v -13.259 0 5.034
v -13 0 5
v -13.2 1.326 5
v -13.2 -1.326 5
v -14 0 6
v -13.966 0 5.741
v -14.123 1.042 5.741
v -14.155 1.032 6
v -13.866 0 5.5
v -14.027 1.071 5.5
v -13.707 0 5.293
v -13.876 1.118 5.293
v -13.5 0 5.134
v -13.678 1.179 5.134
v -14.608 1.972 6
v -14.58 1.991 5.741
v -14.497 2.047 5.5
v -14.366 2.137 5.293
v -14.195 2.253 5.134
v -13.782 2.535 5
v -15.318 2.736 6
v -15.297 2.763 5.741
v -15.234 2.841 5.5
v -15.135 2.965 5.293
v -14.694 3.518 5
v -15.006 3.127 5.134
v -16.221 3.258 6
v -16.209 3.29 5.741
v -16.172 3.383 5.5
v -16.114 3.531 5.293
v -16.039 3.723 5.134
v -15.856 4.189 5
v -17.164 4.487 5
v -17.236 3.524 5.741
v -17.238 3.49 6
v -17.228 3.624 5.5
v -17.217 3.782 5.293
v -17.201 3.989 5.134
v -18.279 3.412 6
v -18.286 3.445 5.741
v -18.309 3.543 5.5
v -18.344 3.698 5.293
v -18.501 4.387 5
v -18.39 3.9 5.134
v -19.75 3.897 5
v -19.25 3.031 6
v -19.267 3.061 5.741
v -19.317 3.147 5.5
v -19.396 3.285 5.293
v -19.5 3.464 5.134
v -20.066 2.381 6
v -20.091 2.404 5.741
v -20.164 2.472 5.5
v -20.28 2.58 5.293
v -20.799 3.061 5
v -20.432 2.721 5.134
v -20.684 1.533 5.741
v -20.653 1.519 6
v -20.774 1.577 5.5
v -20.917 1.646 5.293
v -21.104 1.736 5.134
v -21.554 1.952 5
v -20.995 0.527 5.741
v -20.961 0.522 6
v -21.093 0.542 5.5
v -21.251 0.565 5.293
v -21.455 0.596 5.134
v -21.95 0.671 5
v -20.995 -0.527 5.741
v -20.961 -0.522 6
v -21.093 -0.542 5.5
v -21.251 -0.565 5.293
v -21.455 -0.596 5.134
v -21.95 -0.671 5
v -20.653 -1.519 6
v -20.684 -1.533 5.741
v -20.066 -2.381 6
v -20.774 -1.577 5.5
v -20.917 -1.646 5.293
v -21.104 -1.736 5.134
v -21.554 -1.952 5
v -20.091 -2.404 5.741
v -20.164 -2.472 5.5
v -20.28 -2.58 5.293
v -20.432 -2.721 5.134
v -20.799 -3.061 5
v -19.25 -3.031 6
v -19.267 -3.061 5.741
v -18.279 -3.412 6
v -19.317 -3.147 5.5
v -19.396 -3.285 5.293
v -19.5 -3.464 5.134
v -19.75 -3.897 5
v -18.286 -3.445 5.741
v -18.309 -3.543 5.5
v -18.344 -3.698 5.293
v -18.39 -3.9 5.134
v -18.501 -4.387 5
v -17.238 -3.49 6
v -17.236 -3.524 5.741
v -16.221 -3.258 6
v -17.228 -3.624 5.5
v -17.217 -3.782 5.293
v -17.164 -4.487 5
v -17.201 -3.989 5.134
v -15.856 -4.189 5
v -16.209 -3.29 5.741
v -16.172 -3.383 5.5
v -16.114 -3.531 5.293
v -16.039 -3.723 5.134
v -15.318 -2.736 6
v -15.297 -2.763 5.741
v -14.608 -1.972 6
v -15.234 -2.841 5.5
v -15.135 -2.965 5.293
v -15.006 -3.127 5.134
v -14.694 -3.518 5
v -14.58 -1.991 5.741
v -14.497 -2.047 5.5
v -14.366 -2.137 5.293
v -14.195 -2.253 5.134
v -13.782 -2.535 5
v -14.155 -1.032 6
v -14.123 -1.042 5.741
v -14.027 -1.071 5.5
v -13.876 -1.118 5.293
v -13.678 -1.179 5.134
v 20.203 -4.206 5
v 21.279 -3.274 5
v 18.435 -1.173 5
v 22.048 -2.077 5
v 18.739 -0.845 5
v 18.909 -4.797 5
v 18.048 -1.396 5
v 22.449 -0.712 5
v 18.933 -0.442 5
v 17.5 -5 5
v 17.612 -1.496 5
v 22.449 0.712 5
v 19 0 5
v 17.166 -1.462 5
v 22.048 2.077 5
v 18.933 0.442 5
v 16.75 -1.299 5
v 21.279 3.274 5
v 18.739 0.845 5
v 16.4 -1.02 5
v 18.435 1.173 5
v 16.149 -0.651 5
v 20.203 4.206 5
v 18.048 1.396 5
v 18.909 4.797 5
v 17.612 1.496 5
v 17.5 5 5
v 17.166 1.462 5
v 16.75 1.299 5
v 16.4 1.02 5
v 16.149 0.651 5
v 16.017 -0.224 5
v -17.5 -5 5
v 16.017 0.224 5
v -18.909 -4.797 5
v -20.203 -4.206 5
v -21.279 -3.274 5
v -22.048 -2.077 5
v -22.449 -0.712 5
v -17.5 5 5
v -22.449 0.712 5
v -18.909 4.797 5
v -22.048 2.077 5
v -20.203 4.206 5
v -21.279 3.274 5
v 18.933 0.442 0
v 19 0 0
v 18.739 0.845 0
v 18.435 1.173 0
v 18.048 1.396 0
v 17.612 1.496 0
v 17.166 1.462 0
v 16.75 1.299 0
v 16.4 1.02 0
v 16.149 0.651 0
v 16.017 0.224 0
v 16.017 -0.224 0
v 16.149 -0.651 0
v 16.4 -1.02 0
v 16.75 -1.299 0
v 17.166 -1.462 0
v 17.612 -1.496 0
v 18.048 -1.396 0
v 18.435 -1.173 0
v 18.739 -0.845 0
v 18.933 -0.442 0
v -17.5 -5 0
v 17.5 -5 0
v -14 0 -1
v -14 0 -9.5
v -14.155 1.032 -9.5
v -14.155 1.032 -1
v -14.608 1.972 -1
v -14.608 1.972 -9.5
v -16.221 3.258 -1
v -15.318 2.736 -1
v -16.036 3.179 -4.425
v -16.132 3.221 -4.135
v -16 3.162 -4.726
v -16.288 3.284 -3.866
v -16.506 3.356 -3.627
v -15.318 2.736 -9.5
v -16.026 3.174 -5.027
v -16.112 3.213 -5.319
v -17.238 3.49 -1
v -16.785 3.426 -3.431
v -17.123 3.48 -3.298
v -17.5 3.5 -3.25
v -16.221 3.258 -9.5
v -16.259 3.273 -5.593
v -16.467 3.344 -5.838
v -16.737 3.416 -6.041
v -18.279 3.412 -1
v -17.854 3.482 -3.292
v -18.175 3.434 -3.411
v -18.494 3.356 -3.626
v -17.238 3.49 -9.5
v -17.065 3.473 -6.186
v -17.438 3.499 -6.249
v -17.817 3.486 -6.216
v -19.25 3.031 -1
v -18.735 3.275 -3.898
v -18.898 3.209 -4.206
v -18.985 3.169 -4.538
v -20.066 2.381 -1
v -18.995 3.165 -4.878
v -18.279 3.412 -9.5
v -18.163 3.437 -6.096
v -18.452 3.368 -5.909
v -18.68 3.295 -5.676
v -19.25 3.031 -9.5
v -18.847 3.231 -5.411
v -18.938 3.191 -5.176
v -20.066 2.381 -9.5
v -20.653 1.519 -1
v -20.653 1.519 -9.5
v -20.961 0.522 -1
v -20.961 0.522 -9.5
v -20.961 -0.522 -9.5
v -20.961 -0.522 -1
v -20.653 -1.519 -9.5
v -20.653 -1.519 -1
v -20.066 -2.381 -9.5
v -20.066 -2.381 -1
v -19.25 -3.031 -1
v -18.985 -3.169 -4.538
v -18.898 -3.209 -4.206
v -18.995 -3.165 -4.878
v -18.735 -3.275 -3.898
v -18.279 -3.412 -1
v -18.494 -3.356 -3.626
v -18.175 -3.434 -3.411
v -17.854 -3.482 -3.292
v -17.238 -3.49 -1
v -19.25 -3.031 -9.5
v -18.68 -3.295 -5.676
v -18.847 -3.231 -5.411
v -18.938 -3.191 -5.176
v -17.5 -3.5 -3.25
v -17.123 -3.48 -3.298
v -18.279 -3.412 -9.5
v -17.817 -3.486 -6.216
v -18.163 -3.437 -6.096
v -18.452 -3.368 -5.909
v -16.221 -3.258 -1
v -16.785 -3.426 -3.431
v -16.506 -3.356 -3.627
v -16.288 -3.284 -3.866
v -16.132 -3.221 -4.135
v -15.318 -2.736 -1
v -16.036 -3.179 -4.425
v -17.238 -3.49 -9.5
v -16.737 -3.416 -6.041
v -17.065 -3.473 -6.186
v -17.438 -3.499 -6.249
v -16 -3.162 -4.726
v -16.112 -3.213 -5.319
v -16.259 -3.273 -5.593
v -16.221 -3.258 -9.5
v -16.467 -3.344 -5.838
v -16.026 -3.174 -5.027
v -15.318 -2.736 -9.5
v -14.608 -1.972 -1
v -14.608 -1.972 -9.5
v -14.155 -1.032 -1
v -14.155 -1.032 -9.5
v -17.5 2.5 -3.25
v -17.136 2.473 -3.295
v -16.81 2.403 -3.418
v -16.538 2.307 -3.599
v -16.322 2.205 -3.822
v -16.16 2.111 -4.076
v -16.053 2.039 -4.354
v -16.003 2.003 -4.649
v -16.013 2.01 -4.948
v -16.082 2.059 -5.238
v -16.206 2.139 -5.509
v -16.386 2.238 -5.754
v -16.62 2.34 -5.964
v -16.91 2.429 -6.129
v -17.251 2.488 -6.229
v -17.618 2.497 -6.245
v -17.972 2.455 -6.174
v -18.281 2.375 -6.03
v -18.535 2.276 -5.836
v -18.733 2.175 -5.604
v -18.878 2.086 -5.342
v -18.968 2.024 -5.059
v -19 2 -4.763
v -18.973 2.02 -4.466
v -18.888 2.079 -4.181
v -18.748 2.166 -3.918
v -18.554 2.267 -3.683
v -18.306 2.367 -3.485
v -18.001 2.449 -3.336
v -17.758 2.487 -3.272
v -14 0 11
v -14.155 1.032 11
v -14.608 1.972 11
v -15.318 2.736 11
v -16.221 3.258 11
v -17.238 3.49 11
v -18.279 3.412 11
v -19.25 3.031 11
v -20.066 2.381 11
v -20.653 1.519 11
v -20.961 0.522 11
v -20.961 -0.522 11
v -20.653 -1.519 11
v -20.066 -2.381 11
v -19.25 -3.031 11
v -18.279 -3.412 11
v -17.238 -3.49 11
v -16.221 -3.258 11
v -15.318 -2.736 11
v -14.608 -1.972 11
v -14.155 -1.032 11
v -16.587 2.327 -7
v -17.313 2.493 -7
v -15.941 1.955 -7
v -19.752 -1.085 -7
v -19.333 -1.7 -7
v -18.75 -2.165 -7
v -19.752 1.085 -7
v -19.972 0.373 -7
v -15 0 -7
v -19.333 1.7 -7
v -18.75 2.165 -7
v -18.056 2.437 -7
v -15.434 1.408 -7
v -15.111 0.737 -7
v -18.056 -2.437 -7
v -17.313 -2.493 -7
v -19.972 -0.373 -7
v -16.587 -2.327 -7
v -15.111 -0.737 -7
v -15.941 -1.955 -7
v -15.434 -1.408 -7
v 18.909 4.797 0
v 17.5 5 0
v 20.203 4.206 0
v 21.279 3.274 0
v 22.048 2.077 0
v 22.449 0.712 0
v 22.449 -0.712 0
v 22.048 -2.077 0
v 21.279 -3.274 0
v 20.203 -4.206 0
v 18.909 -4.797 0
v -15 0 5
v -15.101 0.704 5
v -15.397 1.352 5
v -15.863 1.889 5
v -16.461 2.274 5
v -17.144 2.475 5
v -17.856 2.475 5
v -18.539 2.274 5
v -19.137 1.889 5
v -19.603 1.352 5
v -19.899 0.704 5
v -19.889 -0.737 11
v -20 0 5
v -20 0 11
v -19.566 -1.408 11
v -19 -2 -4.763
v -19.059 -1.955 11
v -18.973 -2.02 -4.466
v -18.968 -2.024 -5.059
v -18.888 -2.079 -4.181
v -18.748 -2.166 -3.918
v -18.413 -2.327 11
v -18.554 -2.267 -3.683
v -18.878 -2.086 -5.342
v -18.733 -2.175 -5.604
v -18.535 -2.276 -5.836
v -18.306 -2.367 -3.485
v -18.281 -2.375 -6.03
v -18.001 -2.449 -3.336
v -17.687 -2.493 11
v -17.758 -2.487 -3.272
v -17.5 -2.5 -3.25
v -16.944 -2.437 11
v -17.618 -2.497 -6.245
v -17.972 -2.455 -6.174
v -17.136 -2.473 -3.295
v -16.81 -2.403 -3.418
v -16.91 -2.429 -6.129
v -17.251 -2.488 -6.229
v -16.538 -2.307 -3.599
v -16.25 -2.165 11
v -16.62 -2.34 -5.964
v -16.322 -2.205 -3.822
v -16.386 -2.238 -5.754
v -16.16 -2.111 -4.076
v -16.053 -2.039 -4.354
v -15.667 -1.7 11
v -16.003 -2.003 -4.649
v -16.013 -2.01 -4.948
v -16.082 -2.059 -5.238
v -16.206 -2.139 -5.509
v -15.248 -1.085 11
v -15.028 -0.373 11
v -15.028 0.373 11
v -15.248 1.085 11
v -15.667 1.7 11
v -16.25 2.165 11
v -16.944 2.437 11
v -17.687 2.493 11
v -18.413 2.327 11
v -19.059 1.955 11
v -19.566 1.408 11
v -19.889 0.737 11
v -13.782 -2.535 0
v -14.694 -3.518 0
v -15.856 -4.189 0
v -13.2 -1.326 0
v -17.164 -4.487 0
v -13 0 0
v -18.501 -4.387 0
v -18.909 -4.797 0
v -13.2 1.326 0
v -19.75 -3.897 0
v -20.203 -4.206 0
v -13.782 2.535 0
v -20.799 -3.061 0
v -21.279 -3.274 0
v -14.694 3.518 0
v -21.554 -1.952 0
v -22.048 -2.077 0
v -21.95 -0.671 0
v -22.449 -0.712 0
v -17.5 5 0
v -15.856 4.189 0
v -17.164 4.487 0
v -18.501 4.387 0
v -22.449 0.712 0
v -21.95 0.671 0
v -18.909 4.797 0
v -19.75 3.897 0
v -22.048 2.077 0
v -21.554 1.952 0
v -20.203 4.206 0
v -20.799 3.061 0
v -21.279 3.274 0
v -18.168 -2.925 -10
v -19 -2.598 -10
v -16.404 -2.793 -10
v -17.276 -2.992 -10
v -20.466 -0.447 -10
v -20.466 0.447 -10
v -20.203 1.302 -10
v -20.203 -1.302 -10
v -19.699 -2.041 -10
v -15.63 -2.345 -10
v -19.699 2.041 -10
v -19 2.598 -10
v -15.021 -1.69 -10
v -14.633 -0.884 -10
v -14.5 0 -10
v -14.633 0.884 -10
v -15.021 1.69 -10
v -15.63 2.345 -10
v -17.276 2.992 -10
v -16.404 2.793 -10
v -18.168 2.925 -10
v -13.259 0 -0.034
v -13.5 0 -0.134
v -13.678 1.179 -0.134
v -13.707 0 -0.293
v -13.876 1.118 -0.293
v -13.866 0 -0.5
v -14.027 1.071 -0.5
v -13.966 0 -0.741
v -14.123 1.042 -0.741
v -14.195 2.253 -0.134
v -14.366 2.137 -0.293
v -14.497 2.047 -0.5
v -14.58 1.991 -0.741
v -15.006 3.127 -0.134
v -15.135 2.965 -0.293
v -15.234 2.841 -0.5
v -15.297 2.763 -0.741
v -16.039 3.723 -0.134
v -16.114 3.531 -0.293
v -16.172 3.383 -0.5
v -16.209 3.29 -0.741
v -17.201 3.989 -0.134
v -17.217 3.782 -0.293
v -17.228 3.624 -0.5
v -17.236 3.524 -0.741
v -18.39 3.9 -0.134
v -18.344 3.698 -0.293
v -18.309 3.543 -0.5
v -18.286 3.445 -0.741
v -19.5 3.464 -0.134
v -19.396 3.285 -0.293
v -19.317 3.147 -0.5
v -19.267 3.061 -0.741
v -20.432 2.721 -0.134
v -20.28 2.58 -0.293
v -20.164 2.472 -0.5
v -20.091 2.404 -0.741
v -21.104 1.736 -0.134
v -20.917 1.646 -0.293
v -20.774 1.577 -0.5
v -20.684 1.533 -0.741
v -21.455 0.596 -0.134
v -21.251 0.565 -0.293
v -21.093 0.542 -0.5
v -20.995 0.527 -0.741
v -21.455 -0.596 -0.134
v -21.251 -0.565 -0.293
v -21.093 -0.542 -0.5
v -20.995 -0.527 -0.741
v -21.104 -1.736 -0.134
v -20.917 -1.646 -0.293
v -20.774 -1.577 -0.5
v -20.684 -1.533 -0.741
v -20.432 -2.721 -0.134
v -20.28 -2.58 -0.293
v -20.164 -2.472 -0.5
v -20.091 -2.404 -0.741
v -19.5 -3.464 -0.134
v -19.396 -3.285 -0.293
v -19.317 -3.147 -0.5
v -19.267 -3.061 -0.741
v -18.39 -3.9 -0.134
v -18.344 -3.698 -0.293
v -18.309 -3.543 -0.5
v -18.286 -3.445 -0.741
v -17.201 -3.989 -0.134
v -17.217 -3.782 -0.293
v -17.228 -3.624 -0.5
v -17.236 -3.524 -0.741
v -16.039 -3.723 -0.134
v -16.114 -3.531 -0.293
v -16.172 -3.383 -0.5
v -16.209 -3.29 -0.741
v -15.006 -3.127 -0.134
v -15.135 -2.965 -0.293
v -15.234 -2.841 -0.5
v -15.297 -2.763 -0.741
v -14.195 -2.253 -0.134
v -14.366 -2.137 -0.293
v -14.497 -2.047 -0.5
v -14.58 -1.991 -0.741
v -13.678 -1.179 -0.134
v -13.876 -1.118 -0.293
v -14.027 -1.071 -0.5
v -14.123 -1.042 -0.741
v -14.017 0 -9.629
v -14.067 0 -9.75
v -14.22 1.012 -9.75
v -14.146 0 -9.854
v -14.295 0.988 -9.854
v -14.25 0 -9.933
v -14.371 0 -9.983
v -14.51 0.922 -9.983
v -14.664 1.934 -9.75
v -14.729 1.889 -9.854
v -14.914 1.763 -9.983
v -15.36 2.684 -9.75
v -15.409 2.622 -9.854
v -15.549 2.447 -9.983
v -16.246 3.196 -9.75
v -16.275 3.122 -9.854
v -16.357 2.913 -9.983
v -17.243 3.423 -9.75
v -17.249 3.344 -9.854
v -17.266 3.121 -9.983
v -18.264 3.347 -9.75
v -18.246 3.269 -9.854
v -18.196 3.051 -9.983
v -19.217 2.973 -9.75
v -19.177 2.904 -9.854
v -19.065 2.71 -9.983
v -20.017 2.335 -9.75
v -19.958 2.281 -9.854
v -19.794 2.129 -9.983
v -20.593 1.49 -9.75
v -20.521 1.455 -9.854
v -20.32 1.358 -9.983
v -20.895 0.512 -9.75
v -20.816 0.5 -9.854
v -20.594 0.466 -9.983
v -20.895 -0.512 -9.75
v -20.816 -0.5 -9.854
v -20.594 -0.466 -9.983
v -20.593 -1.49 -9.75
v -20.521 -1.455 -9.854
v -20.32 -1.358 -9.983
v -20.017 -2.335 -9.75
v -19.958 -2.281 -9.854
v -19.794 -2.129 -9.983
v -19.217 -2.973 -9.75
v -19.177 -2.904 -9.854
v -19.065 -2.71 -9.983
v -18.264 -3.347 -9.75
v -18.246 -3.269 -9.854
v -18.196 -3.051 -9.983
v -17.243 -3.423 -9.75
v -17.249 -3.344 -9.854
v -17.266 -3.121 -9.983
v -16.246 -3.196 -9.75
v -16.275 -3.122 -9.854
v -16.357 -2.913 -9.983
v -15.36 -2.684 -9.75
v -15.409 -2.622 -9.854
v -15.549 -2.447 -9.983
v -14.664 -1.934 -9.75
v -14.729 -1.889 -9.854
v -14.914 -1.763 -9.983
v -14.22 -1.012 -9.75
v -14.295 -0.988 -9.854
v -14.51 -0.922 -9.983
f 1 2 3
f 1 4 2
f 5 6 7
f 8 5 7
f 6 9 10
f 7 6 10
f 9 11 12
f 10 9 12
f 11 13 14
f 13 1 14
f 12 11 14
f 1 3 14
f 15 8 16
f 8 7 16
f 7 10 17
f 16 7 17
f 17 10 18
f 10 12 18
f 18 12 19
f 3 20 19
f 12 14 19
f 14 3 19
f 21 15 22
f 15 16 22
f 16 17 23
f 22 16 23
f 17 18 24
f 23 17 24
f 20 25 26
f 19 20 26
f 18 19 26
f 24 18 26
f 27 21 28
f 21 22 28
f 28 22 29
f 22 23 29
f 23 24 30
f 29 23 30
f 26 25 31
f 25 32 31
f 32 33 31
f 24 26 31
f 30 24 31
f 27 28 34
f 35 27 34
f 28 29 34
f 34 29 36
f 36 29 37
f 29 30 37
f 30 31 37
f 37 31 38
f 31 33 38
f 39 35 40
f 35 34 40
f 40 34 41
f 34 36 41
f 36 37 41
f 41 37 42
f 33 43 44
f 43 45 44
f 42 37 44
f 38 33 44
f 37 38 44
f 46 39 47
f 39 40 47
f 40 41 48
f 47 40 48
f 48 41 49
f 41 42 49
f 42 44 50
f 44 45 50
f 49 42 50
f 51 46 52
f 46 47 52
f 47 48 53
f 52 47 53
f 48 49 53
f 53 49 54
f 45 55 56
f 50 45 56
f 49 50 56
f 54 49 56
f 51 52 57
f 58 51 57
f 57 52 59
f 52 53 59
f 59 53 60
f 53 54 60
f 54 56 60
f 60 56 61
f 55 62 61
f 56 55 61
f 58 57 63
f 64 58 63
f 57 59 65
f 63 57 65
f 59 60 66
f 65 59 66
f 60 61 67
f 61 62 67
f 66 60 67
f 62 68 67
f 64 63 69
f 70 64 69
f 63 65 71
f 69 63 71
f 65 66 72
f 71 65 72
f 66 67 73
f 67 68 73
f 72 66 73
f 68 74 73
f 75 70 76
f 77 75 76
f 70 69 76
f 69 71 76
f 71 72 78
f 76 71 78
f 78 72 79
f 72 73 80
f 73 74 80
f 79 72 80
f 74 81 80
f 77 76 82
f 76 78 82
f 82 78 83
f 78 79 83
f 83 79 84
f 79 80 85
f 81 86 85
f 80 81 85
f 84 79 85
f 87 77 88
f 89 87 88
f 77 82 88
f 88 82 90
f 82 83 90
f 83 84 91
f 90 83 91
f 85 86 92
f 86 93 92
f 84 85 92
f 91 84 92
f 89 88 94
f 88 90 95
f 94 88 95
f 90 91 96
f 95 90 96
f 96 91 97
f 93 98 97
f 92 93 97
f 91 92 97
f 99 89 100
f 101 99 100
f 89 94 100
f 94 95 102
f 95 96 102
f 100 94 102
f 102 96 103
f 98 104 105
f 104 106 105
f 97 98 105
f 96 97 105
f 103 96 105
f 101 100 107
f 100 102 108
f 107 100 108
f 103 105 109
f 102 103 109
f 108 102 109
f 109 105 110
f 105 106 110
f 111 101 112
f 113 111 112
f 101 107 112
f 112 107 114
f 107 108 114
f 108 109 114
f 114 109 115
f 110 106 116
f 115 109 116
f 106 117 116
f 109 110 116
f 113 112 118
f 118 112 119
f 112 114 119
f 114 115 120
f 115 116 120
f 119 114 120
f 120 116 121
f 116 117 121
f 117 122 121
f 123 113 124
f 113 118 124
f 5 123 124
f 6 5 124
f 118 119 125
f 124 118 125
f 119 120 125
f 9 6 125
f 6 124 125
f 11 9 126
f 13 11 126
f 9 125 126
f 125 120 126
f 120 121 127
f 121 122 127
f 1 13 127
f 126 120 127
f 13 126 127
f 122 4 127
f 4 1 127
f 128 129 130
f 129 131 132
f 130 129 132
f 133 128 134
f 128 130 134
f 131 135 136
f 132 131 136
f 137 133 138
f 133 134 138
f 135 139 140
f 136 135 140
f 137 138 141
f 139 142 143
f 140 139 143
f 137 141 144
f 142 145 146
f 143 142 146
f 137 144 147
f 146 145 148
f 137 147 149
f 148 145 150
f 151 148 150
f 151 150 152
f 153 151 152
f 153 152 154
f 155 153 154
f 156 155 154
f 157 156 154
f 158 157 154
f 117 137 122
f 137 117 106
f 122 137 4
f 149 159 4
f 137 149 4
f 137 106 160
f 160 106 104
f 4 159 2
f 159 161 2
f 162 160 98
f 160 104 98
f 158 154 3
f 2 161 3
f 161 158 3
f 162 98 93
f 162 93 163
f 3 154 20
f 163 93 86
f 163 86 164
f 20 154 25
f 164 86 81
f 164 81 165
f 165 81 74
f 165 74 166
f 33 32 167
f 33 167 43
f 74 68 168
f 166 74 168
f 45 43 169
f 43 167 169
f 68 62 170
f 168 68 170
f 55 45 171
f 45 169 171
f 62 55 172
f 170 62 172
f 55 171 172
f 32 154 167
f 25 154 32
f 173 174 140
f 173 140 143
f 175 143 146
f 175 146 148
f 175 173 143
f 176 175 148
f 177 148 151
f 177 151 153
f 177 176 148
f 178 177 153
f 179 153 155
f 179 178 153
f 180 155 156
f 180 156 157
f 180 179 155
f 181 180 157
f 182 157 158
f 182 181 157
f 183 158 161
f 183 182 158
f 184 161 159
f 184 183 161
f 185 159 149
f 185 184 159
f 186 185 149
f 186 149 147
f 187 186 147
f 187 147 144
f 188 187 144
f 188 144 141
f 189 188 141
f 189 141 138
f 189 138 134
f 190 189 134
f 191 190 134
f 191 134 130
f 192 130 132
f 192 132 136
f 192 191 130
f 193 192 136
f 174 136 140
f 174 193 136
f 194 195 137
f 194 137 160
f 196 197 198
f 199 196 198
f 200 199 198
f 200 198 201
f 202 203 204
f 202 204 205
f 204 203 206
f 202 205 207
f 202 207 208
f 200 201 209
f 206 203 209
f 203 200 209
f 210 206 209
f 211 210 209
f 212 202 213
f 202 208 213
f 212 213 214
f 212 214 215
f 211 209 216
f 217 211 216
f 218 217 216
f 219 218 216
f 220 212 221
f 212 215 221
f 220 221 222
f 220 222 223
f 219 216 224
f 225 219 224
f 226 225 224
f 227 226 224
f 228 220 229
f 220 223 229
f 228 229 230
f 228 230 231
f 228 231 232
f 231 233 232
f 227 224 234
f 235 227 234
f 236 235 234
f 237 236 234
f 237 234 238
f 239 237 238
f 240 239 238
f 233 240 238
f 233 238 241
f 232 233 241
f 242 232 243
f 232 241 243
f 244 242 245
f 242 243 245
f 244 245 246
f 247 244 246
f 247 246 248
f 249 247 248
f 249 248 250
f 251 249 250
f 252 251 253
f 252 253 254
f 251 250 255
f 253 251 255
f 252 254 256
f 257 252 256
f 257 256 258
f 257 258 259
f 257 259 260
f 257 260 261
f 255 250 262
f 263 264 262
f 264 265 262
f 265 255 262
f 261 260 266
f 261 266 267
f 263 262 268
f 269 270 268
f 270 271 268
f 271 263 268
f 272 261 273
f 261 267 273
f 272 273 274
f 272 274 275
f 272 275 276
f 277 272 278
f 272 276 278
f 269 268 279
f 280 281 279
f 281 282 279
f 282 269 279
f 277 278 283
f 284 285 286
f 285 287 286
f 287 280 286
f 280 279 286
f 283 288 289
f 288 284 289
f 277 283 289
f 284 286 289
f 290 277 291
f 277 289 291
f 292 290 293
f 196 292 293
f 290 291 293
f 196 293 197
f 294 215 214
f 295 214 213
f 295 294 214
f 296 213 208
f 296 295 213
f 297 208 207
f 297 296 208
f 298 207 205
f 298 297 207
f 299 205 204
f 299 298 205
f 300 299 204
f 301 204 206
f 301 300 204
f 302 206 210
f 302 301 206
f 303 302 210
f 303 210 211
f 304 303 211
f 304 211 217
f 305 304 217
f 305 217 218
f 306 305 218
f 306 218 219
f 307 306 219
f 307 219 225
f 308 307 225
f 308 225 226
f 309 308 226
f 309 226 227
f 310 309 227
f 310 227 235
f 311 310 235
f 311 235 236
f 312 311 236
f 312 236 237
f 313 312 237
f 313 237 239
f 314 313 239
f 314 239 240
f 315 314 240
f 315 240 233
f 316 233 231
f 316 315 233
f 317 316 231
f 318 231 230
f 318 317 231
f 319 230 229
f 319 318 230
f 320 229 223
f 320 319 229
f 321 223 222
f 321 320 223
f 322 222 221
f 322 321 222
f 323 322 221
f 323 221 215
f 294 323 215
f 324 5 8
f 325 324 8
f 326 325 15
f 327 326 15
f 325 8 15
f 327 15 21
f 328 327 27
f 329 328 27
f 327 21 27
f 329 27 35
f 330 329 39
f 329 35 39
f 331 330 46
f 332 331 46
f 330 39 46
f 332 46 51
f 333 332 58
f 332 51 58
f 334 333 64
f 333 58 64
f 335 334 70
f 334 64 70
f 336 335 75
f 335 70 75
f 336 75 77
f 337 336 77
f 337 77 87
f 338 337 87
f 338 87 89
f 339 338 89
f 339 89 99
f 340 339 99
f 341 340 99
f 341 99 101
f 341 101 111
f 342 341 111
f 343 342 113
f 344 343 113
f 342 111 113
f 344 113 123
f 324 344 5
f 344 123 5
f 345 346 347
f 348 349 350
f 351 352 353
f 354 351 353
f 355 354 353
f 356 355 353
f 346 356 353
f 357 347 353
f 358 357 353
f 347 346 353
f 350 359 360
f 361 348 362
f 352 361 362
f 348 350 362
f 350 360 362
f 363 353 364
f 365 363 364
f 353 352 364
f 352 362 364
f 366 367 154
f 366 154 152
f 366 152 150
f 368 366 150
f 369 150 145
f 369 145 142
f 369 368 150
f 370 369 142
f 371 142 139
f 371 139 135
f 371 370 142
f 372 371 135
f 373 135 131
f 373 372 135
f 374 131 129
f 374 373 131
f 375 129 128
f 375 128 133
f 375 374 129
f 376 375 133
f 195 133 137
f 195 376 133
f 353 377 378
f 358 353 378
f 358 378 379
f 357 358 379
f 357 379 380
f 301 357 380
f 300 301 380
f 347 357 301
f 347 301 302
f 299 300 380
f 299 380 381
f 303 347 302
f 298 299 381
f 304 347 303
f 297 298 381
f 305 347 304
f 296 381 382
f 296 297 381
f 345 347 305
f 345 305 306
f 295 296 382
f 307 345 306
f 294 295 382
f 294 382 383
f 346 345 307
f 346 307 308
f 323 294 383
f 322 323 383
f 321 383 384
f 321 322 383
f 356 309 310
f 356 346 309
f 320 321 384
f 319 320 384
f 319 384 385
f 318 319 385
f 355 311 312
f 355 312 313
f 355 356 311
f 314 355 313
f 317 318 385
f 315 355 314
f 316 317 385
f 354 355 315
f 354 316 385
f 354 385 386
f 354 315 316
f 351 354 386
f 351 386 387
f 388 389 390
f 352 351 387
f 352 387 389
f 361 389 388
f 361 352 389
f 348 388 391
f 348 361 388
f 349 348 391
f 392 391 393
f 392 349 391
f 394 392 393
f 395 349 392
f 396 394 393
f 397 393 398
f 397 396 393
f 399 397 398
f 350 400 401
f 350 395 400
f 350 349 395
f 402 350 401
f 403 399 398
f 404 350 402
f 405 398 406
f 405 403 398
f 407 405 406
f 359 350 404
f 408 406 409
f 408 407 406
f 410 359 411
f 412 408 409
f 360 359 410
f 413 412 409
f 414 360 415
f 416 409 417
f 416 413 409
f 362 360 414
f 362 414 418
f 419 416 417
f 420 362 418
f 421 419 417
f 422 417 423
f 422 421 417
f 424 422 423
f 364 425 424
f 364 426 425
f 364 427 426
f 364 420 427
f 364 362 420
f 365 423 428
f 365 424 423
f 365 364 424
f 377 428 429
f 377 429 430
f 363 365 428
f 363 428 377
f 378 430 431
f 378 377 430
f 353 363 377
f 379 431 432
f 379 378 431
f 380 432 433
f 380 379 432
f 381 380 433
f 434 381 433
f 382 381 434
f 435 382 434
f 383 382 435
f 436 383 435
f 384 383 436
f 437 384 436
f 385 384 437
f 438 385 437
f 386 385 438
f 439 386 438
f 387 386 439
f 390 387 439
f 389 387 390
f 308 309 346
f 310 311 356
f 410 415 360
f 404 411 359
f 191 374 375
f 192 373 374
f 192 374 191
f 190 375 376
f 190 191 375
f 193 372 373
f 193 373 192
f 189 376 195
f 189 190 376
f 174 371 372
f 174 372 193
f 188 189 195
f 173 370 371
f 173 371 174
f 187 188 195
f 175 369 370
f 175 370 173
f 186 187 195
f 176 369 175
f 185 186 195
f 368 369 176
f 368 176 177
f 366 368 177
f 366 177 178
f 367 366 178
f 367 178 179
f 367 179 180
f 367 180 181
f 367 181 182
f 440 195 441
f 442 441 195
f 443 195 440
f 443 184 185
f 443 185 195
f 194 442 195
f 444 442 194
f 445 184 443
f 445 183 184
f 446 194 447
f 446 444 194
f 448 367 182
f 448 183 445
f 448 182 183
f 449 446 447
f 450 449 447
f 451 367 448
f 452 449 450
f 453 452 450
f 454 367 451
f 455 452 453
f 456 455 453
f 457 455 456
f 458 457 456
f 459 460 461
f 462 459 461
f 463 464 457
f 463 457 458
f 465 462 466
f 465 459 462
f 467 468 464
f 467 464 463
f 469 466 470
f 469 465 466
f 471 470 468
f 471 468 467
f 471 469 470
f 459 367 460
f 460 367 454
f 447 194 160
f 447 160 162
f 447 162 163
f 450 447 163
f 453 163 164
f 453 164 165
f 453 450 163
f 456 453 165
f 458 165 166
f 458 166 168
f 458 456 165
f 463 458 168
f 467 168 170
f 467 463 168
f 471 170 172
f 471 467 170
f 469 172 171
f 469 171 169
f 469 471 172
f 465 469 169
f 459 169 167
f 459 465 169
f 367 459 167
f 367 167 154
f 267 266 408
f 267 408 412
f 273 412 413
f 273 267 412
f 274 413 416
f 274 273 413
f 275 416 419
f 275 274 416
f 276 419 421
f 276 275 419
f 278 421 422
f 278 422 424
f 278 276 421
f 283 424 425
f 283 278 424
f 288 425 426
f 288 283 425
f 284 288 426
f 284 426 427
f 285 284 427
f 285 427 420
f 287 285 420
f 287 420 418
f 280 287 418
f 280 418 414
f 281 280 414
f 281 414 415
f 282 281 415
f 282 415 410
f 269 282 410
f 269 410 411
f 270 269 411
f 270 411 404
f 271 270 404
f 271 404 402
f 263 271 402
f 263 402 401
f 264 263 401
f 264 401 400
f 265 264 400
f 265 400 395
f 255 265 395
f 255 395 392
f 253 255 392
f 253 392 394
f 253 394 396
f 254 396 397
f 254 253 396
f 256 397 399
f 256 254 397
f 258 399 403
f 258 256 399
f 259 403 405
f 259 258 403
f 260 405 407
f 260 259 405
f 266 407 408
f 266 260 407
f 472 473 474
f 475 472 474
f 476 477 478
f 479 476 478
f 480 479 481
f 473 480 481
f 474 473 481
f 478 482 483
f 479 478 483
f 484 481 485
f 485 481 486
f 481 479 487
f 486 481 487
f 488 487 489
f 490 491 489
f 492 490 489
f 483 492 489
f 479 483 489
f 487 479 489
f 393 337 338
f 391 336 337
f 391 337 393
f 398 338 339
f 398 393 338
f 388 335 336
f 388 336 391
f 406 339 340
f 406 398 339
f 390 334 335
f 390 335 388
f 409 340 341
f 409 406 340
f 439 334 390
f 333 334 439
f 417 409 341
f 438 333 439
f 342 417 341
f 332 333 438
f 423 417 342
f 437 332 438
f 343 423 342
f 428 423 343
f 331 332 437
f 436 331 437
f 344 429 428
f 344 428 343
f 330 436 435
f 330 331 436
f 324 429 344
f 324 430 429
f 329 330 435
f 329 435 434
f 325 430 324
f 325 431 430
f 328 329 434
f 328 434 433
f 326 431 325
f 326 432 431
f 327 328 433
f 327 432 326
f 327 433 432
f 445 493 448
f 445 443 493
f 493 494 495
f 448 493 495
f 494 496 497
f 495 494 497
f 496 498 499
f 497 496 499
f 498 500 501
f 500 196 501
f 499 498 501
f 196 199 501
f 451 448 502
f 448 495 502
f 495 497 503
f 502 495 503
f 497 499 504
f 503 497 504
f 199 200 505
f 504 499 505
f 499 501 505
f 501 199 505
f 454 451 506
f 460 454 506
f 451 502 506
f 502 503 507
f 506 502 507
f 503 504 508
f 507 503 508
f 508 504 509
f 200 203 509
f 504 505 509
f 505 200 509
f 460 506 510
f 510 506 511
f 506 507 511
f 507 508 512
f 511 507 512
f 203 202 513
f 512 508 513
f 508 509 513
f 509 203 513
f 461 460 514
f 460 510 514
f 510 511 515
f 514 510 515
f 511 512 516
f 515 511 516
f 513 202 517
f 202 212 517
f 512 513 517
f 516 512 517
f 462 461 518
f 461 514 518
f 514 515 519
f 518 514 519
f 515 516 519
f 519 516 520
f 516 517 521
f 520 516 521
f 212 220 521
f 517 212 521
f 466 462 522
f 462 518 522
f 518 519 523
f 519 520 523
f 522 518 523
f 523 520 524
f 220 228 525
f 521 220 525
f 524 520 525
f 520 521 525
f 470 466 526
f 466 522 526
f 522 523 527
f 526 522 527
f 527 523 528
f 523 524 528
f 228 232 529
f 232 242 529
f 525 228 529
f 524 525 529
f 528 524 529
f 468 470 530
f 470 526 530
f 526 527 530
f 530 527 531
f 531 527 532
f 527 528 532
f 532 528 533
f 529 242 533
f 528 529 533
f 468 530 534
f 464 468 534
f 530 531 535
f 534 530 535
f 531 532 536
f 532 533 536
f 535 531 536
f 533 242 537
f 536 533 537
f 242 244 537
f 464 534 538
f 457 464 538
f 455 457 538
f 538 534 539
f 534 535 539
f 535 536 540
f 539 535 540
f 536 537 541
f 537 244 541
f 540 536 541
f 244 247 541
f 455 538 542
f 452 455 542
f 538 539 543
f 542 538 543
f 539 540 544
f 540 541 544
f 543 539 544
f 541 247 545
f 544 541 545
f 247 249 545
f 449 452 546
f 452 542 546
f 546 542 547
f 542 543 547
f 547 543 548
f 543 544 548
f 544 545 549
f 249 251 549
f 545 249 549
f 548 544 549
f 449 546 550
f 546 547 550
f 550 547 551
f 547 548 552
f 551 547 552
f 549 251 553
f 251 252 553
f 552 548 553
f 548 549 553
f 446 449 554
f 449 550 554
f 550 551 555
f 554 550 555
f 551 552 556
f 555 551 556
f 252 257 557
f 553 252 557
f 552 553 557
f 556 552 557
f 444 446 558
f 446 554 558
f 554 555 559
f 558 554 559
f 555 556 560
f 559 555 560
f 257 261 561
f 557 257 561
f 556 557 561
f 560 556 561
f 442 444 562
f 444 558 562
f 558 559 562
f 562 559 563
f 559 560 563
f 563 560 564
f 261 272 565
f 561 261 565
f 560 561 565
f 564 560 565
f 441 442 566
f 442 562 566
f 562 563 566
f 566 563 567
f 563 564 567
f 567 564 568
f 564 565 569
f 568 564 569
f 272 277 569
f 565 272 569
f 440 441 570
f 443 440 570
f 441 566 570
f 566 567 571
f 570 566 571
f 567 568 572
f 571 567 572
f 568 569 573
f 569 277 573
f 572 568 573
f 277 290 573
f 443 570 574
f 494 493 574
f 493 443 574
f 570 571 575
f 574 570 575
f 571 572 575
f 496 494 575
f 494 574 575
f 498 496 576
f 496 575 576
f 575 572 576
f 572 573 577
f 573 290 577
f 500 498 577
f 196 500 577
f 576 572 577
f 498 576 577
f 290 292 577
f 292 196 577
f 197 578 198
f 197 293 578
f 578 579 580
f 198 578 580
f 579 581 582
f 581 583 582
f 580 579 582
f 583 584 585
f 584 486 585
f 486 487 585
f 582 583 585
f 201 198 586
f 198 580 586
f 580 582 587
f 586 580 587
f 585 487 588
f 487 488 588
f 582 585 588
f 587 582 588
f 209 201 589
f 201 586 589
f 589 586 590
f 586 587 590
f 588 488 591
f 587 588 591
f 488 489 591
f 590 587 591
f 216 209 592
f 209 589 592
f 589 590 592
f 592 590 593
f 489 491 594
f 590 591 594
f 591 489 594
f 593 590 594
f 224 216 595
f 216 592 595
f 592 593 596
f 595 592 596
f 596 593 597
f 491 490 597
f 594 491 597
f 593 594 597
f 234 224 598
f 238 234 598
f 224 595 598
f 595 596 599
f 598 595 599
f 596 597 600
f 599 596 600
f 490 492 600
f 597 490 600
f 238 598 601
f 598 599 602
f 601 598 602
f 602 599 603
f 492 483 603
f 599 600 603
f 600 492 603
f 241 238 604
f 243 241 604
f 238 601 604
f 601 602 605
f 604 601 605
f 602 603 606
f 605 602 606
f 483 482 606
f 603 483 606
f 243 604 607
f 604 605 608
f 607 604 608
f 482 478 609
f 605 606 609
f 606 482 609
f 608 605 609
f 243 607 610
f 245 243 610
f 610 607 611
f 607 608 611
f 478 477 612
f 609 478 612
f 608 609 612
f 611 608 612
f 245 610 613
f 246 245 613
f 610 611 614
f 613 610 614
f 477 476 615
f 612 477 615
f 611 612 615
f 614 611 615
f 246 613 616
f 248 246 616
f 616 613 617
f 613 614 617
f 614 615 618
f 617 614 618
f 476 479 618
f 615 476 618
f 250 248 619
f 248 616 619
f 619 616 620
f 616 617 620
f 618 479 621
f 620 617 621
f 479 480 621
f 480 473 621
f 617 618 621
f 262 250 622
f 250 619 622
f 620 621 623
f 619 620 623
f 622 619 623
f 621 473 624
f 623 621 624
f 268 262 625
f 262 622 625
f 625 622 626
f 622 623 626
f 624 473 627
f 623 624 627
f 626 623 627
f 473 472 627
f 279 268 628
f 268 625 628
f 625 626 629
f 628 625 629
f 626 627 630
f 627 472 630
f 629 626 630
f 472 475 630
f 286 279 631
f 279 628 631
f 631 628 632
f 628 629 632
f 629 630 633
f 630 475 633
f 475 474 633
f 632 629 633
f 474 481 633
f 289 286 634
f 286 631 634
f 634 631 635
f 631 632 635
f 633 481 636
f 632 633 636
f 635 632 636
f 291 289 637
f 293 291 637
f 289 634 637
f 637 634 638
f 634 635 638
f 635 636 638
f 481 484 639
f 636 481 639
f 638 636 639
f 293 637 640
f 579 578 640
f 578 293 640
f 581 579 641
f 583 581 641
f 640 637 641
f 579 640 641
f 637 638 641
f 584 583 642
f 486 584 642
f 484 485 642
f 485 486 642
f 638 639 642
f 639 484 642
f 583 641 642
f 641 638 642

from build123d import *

# Parameters (mm, degrees)
ESQUISSE1_R                  = 2.5
ESQUISSE1_R_2                = 1.5
BOSS_EXTRU_1_DEPTH           = 5
BOSS_EXTRU_2_START           = -15
ESQUISSE2_R                  = 3.5
ESQUISSE2_R_2                = 2.5
BOSS_EXTRU_2_DEPTH           = 10
ESQUISSE3_R                  = 3.5
BOSS_EXTRU_3_DEPTH           = 3
CONG_1_R                     = 0.5
ENL_V_MAT_EXTRU_1_DEPTH      = 26.124689053
ENL_V_MAT_EXTRU_1_DEPTH_BACK = 26.124689053
ESQUISSE4_R                  = 1.5
ESQUISSE5_R                  = 3.5
ESQUISSE5_R_2                = 2.5
BOSS_EXTRU_4_DEPTH           = 6
CONG_2_R                     = 1
CONG_3_R                     = 1


with BuildPart() as part:
    # Esquisse1 → Boss.-Extru.1 (new body)
    with BuildSketch(Plane.XY):
        with BuildLine():
            Line((-17.5, 5), (17.5, 5))
            ThreePointArc((17.5, 5), (22.5, 0), (17.5, -5))
            Line((17.5, -5), (-17.5, -5))
            ThreePointArc((-17.5, -5), (-22.5, 0), (-17.5, 5))
        make_face()
        with Locations((-17.5, 0)):
            Circle(ESQUISSE1_R, mode=Mode.SUBTRACT)
        with Locations((17.5, 0)):
            Circle(ESQUISSE1_R_2, mode=Mode.SUBTRACT)
    extrude(amount=BOSS_EXTRU_1_DEPTH)

    # Esquisse2 → Boss.-Extru.2 (add)
    with BuildSketch(Plane.XY.offset(5).offset(BOSS_EXTRU_2_START)):
        with Locations((-17.5, 0)):
            Circle(ESQUISSE2_R)
        with Locations((-17.5, 0)):
            Circle(ESQUISSE2_R_2, mode=Mode.SUBTRACT)
    extrude(amount=BOSS_EXTRU_2_DEPTH)

    # Esquisse3 → Boss.-Extru.3 (add)
    with BuildSketch(Plane(origin=(0, 0, -10), x_dir=(-1, 0, 0), z_dir=(0, 0, -1))):
        with Locations(Location((17.5, 0, 0), (0, 0, 180))):
            Circle(ESQUISSE3_R)
    extrude(amount=-BOSS_EXTRU_3_DEPTH)

    # Congé1
    cong_1_edges = [part.edges().sort_by_distance(p)[0] for p in [
        (-21, 0, -10),
    ]]
    fillet(cong_1_edges, radius=CONG_1_R)

    # Esquisse4 → Enlèv. mat.-Extru.1 (cut, two sides: drawn at the far end of the back side and taken through both)
    with BuildSketch(Plane(origin=(0, 0, 0), x_dir=(1, 0, 0), z_dir=(0, 1, 0)).offset(-ENL_V_MAT_EXTRU_1_DEPTH_BACK)):
        with Locations(Location((-17.5, 4.75, 0), (0, 0, 270))):
            Circle(ESQUISSE4_R)
    extrude(amount=ENL_V_MAT_EXTRU_1_DEPTH + ENL_V_MAT_EXTRU_1_DEPTH_BACK, mode=Mode.SUBTRACT)

    # Esquisse5 → Boss.-Extru.4 (add)
    with BuildSketch(Plane.XY.offset(5)):
        with Locations((-17.5, 0)):
            Circle(ESQUISSE5_R)
        with Locations(Location((-17.5, 0, 0), (0, 0, 180))):
            Circle(ESQUISSE5_R_2, mode=Mode.SUBTRACT)
    extrude(amount=BOSS_EXTRU_4_DEPTH)

    # Congé2
    cong_2_edges = [part.edges().sort_by_distance(p)[0] for p in [
        (-21, 0, 5),
    ]]
    fillet(cong_2_edges, radius=CONG_2_R)

    # Congé3
    cong_3_edges = [part.edges().sort_by_distance(p)[0] for p in [
        (-21, 0, 0),
    ]]
    fillet(cong_3_edges, radius=CONG_3_R)


solid = part.part
